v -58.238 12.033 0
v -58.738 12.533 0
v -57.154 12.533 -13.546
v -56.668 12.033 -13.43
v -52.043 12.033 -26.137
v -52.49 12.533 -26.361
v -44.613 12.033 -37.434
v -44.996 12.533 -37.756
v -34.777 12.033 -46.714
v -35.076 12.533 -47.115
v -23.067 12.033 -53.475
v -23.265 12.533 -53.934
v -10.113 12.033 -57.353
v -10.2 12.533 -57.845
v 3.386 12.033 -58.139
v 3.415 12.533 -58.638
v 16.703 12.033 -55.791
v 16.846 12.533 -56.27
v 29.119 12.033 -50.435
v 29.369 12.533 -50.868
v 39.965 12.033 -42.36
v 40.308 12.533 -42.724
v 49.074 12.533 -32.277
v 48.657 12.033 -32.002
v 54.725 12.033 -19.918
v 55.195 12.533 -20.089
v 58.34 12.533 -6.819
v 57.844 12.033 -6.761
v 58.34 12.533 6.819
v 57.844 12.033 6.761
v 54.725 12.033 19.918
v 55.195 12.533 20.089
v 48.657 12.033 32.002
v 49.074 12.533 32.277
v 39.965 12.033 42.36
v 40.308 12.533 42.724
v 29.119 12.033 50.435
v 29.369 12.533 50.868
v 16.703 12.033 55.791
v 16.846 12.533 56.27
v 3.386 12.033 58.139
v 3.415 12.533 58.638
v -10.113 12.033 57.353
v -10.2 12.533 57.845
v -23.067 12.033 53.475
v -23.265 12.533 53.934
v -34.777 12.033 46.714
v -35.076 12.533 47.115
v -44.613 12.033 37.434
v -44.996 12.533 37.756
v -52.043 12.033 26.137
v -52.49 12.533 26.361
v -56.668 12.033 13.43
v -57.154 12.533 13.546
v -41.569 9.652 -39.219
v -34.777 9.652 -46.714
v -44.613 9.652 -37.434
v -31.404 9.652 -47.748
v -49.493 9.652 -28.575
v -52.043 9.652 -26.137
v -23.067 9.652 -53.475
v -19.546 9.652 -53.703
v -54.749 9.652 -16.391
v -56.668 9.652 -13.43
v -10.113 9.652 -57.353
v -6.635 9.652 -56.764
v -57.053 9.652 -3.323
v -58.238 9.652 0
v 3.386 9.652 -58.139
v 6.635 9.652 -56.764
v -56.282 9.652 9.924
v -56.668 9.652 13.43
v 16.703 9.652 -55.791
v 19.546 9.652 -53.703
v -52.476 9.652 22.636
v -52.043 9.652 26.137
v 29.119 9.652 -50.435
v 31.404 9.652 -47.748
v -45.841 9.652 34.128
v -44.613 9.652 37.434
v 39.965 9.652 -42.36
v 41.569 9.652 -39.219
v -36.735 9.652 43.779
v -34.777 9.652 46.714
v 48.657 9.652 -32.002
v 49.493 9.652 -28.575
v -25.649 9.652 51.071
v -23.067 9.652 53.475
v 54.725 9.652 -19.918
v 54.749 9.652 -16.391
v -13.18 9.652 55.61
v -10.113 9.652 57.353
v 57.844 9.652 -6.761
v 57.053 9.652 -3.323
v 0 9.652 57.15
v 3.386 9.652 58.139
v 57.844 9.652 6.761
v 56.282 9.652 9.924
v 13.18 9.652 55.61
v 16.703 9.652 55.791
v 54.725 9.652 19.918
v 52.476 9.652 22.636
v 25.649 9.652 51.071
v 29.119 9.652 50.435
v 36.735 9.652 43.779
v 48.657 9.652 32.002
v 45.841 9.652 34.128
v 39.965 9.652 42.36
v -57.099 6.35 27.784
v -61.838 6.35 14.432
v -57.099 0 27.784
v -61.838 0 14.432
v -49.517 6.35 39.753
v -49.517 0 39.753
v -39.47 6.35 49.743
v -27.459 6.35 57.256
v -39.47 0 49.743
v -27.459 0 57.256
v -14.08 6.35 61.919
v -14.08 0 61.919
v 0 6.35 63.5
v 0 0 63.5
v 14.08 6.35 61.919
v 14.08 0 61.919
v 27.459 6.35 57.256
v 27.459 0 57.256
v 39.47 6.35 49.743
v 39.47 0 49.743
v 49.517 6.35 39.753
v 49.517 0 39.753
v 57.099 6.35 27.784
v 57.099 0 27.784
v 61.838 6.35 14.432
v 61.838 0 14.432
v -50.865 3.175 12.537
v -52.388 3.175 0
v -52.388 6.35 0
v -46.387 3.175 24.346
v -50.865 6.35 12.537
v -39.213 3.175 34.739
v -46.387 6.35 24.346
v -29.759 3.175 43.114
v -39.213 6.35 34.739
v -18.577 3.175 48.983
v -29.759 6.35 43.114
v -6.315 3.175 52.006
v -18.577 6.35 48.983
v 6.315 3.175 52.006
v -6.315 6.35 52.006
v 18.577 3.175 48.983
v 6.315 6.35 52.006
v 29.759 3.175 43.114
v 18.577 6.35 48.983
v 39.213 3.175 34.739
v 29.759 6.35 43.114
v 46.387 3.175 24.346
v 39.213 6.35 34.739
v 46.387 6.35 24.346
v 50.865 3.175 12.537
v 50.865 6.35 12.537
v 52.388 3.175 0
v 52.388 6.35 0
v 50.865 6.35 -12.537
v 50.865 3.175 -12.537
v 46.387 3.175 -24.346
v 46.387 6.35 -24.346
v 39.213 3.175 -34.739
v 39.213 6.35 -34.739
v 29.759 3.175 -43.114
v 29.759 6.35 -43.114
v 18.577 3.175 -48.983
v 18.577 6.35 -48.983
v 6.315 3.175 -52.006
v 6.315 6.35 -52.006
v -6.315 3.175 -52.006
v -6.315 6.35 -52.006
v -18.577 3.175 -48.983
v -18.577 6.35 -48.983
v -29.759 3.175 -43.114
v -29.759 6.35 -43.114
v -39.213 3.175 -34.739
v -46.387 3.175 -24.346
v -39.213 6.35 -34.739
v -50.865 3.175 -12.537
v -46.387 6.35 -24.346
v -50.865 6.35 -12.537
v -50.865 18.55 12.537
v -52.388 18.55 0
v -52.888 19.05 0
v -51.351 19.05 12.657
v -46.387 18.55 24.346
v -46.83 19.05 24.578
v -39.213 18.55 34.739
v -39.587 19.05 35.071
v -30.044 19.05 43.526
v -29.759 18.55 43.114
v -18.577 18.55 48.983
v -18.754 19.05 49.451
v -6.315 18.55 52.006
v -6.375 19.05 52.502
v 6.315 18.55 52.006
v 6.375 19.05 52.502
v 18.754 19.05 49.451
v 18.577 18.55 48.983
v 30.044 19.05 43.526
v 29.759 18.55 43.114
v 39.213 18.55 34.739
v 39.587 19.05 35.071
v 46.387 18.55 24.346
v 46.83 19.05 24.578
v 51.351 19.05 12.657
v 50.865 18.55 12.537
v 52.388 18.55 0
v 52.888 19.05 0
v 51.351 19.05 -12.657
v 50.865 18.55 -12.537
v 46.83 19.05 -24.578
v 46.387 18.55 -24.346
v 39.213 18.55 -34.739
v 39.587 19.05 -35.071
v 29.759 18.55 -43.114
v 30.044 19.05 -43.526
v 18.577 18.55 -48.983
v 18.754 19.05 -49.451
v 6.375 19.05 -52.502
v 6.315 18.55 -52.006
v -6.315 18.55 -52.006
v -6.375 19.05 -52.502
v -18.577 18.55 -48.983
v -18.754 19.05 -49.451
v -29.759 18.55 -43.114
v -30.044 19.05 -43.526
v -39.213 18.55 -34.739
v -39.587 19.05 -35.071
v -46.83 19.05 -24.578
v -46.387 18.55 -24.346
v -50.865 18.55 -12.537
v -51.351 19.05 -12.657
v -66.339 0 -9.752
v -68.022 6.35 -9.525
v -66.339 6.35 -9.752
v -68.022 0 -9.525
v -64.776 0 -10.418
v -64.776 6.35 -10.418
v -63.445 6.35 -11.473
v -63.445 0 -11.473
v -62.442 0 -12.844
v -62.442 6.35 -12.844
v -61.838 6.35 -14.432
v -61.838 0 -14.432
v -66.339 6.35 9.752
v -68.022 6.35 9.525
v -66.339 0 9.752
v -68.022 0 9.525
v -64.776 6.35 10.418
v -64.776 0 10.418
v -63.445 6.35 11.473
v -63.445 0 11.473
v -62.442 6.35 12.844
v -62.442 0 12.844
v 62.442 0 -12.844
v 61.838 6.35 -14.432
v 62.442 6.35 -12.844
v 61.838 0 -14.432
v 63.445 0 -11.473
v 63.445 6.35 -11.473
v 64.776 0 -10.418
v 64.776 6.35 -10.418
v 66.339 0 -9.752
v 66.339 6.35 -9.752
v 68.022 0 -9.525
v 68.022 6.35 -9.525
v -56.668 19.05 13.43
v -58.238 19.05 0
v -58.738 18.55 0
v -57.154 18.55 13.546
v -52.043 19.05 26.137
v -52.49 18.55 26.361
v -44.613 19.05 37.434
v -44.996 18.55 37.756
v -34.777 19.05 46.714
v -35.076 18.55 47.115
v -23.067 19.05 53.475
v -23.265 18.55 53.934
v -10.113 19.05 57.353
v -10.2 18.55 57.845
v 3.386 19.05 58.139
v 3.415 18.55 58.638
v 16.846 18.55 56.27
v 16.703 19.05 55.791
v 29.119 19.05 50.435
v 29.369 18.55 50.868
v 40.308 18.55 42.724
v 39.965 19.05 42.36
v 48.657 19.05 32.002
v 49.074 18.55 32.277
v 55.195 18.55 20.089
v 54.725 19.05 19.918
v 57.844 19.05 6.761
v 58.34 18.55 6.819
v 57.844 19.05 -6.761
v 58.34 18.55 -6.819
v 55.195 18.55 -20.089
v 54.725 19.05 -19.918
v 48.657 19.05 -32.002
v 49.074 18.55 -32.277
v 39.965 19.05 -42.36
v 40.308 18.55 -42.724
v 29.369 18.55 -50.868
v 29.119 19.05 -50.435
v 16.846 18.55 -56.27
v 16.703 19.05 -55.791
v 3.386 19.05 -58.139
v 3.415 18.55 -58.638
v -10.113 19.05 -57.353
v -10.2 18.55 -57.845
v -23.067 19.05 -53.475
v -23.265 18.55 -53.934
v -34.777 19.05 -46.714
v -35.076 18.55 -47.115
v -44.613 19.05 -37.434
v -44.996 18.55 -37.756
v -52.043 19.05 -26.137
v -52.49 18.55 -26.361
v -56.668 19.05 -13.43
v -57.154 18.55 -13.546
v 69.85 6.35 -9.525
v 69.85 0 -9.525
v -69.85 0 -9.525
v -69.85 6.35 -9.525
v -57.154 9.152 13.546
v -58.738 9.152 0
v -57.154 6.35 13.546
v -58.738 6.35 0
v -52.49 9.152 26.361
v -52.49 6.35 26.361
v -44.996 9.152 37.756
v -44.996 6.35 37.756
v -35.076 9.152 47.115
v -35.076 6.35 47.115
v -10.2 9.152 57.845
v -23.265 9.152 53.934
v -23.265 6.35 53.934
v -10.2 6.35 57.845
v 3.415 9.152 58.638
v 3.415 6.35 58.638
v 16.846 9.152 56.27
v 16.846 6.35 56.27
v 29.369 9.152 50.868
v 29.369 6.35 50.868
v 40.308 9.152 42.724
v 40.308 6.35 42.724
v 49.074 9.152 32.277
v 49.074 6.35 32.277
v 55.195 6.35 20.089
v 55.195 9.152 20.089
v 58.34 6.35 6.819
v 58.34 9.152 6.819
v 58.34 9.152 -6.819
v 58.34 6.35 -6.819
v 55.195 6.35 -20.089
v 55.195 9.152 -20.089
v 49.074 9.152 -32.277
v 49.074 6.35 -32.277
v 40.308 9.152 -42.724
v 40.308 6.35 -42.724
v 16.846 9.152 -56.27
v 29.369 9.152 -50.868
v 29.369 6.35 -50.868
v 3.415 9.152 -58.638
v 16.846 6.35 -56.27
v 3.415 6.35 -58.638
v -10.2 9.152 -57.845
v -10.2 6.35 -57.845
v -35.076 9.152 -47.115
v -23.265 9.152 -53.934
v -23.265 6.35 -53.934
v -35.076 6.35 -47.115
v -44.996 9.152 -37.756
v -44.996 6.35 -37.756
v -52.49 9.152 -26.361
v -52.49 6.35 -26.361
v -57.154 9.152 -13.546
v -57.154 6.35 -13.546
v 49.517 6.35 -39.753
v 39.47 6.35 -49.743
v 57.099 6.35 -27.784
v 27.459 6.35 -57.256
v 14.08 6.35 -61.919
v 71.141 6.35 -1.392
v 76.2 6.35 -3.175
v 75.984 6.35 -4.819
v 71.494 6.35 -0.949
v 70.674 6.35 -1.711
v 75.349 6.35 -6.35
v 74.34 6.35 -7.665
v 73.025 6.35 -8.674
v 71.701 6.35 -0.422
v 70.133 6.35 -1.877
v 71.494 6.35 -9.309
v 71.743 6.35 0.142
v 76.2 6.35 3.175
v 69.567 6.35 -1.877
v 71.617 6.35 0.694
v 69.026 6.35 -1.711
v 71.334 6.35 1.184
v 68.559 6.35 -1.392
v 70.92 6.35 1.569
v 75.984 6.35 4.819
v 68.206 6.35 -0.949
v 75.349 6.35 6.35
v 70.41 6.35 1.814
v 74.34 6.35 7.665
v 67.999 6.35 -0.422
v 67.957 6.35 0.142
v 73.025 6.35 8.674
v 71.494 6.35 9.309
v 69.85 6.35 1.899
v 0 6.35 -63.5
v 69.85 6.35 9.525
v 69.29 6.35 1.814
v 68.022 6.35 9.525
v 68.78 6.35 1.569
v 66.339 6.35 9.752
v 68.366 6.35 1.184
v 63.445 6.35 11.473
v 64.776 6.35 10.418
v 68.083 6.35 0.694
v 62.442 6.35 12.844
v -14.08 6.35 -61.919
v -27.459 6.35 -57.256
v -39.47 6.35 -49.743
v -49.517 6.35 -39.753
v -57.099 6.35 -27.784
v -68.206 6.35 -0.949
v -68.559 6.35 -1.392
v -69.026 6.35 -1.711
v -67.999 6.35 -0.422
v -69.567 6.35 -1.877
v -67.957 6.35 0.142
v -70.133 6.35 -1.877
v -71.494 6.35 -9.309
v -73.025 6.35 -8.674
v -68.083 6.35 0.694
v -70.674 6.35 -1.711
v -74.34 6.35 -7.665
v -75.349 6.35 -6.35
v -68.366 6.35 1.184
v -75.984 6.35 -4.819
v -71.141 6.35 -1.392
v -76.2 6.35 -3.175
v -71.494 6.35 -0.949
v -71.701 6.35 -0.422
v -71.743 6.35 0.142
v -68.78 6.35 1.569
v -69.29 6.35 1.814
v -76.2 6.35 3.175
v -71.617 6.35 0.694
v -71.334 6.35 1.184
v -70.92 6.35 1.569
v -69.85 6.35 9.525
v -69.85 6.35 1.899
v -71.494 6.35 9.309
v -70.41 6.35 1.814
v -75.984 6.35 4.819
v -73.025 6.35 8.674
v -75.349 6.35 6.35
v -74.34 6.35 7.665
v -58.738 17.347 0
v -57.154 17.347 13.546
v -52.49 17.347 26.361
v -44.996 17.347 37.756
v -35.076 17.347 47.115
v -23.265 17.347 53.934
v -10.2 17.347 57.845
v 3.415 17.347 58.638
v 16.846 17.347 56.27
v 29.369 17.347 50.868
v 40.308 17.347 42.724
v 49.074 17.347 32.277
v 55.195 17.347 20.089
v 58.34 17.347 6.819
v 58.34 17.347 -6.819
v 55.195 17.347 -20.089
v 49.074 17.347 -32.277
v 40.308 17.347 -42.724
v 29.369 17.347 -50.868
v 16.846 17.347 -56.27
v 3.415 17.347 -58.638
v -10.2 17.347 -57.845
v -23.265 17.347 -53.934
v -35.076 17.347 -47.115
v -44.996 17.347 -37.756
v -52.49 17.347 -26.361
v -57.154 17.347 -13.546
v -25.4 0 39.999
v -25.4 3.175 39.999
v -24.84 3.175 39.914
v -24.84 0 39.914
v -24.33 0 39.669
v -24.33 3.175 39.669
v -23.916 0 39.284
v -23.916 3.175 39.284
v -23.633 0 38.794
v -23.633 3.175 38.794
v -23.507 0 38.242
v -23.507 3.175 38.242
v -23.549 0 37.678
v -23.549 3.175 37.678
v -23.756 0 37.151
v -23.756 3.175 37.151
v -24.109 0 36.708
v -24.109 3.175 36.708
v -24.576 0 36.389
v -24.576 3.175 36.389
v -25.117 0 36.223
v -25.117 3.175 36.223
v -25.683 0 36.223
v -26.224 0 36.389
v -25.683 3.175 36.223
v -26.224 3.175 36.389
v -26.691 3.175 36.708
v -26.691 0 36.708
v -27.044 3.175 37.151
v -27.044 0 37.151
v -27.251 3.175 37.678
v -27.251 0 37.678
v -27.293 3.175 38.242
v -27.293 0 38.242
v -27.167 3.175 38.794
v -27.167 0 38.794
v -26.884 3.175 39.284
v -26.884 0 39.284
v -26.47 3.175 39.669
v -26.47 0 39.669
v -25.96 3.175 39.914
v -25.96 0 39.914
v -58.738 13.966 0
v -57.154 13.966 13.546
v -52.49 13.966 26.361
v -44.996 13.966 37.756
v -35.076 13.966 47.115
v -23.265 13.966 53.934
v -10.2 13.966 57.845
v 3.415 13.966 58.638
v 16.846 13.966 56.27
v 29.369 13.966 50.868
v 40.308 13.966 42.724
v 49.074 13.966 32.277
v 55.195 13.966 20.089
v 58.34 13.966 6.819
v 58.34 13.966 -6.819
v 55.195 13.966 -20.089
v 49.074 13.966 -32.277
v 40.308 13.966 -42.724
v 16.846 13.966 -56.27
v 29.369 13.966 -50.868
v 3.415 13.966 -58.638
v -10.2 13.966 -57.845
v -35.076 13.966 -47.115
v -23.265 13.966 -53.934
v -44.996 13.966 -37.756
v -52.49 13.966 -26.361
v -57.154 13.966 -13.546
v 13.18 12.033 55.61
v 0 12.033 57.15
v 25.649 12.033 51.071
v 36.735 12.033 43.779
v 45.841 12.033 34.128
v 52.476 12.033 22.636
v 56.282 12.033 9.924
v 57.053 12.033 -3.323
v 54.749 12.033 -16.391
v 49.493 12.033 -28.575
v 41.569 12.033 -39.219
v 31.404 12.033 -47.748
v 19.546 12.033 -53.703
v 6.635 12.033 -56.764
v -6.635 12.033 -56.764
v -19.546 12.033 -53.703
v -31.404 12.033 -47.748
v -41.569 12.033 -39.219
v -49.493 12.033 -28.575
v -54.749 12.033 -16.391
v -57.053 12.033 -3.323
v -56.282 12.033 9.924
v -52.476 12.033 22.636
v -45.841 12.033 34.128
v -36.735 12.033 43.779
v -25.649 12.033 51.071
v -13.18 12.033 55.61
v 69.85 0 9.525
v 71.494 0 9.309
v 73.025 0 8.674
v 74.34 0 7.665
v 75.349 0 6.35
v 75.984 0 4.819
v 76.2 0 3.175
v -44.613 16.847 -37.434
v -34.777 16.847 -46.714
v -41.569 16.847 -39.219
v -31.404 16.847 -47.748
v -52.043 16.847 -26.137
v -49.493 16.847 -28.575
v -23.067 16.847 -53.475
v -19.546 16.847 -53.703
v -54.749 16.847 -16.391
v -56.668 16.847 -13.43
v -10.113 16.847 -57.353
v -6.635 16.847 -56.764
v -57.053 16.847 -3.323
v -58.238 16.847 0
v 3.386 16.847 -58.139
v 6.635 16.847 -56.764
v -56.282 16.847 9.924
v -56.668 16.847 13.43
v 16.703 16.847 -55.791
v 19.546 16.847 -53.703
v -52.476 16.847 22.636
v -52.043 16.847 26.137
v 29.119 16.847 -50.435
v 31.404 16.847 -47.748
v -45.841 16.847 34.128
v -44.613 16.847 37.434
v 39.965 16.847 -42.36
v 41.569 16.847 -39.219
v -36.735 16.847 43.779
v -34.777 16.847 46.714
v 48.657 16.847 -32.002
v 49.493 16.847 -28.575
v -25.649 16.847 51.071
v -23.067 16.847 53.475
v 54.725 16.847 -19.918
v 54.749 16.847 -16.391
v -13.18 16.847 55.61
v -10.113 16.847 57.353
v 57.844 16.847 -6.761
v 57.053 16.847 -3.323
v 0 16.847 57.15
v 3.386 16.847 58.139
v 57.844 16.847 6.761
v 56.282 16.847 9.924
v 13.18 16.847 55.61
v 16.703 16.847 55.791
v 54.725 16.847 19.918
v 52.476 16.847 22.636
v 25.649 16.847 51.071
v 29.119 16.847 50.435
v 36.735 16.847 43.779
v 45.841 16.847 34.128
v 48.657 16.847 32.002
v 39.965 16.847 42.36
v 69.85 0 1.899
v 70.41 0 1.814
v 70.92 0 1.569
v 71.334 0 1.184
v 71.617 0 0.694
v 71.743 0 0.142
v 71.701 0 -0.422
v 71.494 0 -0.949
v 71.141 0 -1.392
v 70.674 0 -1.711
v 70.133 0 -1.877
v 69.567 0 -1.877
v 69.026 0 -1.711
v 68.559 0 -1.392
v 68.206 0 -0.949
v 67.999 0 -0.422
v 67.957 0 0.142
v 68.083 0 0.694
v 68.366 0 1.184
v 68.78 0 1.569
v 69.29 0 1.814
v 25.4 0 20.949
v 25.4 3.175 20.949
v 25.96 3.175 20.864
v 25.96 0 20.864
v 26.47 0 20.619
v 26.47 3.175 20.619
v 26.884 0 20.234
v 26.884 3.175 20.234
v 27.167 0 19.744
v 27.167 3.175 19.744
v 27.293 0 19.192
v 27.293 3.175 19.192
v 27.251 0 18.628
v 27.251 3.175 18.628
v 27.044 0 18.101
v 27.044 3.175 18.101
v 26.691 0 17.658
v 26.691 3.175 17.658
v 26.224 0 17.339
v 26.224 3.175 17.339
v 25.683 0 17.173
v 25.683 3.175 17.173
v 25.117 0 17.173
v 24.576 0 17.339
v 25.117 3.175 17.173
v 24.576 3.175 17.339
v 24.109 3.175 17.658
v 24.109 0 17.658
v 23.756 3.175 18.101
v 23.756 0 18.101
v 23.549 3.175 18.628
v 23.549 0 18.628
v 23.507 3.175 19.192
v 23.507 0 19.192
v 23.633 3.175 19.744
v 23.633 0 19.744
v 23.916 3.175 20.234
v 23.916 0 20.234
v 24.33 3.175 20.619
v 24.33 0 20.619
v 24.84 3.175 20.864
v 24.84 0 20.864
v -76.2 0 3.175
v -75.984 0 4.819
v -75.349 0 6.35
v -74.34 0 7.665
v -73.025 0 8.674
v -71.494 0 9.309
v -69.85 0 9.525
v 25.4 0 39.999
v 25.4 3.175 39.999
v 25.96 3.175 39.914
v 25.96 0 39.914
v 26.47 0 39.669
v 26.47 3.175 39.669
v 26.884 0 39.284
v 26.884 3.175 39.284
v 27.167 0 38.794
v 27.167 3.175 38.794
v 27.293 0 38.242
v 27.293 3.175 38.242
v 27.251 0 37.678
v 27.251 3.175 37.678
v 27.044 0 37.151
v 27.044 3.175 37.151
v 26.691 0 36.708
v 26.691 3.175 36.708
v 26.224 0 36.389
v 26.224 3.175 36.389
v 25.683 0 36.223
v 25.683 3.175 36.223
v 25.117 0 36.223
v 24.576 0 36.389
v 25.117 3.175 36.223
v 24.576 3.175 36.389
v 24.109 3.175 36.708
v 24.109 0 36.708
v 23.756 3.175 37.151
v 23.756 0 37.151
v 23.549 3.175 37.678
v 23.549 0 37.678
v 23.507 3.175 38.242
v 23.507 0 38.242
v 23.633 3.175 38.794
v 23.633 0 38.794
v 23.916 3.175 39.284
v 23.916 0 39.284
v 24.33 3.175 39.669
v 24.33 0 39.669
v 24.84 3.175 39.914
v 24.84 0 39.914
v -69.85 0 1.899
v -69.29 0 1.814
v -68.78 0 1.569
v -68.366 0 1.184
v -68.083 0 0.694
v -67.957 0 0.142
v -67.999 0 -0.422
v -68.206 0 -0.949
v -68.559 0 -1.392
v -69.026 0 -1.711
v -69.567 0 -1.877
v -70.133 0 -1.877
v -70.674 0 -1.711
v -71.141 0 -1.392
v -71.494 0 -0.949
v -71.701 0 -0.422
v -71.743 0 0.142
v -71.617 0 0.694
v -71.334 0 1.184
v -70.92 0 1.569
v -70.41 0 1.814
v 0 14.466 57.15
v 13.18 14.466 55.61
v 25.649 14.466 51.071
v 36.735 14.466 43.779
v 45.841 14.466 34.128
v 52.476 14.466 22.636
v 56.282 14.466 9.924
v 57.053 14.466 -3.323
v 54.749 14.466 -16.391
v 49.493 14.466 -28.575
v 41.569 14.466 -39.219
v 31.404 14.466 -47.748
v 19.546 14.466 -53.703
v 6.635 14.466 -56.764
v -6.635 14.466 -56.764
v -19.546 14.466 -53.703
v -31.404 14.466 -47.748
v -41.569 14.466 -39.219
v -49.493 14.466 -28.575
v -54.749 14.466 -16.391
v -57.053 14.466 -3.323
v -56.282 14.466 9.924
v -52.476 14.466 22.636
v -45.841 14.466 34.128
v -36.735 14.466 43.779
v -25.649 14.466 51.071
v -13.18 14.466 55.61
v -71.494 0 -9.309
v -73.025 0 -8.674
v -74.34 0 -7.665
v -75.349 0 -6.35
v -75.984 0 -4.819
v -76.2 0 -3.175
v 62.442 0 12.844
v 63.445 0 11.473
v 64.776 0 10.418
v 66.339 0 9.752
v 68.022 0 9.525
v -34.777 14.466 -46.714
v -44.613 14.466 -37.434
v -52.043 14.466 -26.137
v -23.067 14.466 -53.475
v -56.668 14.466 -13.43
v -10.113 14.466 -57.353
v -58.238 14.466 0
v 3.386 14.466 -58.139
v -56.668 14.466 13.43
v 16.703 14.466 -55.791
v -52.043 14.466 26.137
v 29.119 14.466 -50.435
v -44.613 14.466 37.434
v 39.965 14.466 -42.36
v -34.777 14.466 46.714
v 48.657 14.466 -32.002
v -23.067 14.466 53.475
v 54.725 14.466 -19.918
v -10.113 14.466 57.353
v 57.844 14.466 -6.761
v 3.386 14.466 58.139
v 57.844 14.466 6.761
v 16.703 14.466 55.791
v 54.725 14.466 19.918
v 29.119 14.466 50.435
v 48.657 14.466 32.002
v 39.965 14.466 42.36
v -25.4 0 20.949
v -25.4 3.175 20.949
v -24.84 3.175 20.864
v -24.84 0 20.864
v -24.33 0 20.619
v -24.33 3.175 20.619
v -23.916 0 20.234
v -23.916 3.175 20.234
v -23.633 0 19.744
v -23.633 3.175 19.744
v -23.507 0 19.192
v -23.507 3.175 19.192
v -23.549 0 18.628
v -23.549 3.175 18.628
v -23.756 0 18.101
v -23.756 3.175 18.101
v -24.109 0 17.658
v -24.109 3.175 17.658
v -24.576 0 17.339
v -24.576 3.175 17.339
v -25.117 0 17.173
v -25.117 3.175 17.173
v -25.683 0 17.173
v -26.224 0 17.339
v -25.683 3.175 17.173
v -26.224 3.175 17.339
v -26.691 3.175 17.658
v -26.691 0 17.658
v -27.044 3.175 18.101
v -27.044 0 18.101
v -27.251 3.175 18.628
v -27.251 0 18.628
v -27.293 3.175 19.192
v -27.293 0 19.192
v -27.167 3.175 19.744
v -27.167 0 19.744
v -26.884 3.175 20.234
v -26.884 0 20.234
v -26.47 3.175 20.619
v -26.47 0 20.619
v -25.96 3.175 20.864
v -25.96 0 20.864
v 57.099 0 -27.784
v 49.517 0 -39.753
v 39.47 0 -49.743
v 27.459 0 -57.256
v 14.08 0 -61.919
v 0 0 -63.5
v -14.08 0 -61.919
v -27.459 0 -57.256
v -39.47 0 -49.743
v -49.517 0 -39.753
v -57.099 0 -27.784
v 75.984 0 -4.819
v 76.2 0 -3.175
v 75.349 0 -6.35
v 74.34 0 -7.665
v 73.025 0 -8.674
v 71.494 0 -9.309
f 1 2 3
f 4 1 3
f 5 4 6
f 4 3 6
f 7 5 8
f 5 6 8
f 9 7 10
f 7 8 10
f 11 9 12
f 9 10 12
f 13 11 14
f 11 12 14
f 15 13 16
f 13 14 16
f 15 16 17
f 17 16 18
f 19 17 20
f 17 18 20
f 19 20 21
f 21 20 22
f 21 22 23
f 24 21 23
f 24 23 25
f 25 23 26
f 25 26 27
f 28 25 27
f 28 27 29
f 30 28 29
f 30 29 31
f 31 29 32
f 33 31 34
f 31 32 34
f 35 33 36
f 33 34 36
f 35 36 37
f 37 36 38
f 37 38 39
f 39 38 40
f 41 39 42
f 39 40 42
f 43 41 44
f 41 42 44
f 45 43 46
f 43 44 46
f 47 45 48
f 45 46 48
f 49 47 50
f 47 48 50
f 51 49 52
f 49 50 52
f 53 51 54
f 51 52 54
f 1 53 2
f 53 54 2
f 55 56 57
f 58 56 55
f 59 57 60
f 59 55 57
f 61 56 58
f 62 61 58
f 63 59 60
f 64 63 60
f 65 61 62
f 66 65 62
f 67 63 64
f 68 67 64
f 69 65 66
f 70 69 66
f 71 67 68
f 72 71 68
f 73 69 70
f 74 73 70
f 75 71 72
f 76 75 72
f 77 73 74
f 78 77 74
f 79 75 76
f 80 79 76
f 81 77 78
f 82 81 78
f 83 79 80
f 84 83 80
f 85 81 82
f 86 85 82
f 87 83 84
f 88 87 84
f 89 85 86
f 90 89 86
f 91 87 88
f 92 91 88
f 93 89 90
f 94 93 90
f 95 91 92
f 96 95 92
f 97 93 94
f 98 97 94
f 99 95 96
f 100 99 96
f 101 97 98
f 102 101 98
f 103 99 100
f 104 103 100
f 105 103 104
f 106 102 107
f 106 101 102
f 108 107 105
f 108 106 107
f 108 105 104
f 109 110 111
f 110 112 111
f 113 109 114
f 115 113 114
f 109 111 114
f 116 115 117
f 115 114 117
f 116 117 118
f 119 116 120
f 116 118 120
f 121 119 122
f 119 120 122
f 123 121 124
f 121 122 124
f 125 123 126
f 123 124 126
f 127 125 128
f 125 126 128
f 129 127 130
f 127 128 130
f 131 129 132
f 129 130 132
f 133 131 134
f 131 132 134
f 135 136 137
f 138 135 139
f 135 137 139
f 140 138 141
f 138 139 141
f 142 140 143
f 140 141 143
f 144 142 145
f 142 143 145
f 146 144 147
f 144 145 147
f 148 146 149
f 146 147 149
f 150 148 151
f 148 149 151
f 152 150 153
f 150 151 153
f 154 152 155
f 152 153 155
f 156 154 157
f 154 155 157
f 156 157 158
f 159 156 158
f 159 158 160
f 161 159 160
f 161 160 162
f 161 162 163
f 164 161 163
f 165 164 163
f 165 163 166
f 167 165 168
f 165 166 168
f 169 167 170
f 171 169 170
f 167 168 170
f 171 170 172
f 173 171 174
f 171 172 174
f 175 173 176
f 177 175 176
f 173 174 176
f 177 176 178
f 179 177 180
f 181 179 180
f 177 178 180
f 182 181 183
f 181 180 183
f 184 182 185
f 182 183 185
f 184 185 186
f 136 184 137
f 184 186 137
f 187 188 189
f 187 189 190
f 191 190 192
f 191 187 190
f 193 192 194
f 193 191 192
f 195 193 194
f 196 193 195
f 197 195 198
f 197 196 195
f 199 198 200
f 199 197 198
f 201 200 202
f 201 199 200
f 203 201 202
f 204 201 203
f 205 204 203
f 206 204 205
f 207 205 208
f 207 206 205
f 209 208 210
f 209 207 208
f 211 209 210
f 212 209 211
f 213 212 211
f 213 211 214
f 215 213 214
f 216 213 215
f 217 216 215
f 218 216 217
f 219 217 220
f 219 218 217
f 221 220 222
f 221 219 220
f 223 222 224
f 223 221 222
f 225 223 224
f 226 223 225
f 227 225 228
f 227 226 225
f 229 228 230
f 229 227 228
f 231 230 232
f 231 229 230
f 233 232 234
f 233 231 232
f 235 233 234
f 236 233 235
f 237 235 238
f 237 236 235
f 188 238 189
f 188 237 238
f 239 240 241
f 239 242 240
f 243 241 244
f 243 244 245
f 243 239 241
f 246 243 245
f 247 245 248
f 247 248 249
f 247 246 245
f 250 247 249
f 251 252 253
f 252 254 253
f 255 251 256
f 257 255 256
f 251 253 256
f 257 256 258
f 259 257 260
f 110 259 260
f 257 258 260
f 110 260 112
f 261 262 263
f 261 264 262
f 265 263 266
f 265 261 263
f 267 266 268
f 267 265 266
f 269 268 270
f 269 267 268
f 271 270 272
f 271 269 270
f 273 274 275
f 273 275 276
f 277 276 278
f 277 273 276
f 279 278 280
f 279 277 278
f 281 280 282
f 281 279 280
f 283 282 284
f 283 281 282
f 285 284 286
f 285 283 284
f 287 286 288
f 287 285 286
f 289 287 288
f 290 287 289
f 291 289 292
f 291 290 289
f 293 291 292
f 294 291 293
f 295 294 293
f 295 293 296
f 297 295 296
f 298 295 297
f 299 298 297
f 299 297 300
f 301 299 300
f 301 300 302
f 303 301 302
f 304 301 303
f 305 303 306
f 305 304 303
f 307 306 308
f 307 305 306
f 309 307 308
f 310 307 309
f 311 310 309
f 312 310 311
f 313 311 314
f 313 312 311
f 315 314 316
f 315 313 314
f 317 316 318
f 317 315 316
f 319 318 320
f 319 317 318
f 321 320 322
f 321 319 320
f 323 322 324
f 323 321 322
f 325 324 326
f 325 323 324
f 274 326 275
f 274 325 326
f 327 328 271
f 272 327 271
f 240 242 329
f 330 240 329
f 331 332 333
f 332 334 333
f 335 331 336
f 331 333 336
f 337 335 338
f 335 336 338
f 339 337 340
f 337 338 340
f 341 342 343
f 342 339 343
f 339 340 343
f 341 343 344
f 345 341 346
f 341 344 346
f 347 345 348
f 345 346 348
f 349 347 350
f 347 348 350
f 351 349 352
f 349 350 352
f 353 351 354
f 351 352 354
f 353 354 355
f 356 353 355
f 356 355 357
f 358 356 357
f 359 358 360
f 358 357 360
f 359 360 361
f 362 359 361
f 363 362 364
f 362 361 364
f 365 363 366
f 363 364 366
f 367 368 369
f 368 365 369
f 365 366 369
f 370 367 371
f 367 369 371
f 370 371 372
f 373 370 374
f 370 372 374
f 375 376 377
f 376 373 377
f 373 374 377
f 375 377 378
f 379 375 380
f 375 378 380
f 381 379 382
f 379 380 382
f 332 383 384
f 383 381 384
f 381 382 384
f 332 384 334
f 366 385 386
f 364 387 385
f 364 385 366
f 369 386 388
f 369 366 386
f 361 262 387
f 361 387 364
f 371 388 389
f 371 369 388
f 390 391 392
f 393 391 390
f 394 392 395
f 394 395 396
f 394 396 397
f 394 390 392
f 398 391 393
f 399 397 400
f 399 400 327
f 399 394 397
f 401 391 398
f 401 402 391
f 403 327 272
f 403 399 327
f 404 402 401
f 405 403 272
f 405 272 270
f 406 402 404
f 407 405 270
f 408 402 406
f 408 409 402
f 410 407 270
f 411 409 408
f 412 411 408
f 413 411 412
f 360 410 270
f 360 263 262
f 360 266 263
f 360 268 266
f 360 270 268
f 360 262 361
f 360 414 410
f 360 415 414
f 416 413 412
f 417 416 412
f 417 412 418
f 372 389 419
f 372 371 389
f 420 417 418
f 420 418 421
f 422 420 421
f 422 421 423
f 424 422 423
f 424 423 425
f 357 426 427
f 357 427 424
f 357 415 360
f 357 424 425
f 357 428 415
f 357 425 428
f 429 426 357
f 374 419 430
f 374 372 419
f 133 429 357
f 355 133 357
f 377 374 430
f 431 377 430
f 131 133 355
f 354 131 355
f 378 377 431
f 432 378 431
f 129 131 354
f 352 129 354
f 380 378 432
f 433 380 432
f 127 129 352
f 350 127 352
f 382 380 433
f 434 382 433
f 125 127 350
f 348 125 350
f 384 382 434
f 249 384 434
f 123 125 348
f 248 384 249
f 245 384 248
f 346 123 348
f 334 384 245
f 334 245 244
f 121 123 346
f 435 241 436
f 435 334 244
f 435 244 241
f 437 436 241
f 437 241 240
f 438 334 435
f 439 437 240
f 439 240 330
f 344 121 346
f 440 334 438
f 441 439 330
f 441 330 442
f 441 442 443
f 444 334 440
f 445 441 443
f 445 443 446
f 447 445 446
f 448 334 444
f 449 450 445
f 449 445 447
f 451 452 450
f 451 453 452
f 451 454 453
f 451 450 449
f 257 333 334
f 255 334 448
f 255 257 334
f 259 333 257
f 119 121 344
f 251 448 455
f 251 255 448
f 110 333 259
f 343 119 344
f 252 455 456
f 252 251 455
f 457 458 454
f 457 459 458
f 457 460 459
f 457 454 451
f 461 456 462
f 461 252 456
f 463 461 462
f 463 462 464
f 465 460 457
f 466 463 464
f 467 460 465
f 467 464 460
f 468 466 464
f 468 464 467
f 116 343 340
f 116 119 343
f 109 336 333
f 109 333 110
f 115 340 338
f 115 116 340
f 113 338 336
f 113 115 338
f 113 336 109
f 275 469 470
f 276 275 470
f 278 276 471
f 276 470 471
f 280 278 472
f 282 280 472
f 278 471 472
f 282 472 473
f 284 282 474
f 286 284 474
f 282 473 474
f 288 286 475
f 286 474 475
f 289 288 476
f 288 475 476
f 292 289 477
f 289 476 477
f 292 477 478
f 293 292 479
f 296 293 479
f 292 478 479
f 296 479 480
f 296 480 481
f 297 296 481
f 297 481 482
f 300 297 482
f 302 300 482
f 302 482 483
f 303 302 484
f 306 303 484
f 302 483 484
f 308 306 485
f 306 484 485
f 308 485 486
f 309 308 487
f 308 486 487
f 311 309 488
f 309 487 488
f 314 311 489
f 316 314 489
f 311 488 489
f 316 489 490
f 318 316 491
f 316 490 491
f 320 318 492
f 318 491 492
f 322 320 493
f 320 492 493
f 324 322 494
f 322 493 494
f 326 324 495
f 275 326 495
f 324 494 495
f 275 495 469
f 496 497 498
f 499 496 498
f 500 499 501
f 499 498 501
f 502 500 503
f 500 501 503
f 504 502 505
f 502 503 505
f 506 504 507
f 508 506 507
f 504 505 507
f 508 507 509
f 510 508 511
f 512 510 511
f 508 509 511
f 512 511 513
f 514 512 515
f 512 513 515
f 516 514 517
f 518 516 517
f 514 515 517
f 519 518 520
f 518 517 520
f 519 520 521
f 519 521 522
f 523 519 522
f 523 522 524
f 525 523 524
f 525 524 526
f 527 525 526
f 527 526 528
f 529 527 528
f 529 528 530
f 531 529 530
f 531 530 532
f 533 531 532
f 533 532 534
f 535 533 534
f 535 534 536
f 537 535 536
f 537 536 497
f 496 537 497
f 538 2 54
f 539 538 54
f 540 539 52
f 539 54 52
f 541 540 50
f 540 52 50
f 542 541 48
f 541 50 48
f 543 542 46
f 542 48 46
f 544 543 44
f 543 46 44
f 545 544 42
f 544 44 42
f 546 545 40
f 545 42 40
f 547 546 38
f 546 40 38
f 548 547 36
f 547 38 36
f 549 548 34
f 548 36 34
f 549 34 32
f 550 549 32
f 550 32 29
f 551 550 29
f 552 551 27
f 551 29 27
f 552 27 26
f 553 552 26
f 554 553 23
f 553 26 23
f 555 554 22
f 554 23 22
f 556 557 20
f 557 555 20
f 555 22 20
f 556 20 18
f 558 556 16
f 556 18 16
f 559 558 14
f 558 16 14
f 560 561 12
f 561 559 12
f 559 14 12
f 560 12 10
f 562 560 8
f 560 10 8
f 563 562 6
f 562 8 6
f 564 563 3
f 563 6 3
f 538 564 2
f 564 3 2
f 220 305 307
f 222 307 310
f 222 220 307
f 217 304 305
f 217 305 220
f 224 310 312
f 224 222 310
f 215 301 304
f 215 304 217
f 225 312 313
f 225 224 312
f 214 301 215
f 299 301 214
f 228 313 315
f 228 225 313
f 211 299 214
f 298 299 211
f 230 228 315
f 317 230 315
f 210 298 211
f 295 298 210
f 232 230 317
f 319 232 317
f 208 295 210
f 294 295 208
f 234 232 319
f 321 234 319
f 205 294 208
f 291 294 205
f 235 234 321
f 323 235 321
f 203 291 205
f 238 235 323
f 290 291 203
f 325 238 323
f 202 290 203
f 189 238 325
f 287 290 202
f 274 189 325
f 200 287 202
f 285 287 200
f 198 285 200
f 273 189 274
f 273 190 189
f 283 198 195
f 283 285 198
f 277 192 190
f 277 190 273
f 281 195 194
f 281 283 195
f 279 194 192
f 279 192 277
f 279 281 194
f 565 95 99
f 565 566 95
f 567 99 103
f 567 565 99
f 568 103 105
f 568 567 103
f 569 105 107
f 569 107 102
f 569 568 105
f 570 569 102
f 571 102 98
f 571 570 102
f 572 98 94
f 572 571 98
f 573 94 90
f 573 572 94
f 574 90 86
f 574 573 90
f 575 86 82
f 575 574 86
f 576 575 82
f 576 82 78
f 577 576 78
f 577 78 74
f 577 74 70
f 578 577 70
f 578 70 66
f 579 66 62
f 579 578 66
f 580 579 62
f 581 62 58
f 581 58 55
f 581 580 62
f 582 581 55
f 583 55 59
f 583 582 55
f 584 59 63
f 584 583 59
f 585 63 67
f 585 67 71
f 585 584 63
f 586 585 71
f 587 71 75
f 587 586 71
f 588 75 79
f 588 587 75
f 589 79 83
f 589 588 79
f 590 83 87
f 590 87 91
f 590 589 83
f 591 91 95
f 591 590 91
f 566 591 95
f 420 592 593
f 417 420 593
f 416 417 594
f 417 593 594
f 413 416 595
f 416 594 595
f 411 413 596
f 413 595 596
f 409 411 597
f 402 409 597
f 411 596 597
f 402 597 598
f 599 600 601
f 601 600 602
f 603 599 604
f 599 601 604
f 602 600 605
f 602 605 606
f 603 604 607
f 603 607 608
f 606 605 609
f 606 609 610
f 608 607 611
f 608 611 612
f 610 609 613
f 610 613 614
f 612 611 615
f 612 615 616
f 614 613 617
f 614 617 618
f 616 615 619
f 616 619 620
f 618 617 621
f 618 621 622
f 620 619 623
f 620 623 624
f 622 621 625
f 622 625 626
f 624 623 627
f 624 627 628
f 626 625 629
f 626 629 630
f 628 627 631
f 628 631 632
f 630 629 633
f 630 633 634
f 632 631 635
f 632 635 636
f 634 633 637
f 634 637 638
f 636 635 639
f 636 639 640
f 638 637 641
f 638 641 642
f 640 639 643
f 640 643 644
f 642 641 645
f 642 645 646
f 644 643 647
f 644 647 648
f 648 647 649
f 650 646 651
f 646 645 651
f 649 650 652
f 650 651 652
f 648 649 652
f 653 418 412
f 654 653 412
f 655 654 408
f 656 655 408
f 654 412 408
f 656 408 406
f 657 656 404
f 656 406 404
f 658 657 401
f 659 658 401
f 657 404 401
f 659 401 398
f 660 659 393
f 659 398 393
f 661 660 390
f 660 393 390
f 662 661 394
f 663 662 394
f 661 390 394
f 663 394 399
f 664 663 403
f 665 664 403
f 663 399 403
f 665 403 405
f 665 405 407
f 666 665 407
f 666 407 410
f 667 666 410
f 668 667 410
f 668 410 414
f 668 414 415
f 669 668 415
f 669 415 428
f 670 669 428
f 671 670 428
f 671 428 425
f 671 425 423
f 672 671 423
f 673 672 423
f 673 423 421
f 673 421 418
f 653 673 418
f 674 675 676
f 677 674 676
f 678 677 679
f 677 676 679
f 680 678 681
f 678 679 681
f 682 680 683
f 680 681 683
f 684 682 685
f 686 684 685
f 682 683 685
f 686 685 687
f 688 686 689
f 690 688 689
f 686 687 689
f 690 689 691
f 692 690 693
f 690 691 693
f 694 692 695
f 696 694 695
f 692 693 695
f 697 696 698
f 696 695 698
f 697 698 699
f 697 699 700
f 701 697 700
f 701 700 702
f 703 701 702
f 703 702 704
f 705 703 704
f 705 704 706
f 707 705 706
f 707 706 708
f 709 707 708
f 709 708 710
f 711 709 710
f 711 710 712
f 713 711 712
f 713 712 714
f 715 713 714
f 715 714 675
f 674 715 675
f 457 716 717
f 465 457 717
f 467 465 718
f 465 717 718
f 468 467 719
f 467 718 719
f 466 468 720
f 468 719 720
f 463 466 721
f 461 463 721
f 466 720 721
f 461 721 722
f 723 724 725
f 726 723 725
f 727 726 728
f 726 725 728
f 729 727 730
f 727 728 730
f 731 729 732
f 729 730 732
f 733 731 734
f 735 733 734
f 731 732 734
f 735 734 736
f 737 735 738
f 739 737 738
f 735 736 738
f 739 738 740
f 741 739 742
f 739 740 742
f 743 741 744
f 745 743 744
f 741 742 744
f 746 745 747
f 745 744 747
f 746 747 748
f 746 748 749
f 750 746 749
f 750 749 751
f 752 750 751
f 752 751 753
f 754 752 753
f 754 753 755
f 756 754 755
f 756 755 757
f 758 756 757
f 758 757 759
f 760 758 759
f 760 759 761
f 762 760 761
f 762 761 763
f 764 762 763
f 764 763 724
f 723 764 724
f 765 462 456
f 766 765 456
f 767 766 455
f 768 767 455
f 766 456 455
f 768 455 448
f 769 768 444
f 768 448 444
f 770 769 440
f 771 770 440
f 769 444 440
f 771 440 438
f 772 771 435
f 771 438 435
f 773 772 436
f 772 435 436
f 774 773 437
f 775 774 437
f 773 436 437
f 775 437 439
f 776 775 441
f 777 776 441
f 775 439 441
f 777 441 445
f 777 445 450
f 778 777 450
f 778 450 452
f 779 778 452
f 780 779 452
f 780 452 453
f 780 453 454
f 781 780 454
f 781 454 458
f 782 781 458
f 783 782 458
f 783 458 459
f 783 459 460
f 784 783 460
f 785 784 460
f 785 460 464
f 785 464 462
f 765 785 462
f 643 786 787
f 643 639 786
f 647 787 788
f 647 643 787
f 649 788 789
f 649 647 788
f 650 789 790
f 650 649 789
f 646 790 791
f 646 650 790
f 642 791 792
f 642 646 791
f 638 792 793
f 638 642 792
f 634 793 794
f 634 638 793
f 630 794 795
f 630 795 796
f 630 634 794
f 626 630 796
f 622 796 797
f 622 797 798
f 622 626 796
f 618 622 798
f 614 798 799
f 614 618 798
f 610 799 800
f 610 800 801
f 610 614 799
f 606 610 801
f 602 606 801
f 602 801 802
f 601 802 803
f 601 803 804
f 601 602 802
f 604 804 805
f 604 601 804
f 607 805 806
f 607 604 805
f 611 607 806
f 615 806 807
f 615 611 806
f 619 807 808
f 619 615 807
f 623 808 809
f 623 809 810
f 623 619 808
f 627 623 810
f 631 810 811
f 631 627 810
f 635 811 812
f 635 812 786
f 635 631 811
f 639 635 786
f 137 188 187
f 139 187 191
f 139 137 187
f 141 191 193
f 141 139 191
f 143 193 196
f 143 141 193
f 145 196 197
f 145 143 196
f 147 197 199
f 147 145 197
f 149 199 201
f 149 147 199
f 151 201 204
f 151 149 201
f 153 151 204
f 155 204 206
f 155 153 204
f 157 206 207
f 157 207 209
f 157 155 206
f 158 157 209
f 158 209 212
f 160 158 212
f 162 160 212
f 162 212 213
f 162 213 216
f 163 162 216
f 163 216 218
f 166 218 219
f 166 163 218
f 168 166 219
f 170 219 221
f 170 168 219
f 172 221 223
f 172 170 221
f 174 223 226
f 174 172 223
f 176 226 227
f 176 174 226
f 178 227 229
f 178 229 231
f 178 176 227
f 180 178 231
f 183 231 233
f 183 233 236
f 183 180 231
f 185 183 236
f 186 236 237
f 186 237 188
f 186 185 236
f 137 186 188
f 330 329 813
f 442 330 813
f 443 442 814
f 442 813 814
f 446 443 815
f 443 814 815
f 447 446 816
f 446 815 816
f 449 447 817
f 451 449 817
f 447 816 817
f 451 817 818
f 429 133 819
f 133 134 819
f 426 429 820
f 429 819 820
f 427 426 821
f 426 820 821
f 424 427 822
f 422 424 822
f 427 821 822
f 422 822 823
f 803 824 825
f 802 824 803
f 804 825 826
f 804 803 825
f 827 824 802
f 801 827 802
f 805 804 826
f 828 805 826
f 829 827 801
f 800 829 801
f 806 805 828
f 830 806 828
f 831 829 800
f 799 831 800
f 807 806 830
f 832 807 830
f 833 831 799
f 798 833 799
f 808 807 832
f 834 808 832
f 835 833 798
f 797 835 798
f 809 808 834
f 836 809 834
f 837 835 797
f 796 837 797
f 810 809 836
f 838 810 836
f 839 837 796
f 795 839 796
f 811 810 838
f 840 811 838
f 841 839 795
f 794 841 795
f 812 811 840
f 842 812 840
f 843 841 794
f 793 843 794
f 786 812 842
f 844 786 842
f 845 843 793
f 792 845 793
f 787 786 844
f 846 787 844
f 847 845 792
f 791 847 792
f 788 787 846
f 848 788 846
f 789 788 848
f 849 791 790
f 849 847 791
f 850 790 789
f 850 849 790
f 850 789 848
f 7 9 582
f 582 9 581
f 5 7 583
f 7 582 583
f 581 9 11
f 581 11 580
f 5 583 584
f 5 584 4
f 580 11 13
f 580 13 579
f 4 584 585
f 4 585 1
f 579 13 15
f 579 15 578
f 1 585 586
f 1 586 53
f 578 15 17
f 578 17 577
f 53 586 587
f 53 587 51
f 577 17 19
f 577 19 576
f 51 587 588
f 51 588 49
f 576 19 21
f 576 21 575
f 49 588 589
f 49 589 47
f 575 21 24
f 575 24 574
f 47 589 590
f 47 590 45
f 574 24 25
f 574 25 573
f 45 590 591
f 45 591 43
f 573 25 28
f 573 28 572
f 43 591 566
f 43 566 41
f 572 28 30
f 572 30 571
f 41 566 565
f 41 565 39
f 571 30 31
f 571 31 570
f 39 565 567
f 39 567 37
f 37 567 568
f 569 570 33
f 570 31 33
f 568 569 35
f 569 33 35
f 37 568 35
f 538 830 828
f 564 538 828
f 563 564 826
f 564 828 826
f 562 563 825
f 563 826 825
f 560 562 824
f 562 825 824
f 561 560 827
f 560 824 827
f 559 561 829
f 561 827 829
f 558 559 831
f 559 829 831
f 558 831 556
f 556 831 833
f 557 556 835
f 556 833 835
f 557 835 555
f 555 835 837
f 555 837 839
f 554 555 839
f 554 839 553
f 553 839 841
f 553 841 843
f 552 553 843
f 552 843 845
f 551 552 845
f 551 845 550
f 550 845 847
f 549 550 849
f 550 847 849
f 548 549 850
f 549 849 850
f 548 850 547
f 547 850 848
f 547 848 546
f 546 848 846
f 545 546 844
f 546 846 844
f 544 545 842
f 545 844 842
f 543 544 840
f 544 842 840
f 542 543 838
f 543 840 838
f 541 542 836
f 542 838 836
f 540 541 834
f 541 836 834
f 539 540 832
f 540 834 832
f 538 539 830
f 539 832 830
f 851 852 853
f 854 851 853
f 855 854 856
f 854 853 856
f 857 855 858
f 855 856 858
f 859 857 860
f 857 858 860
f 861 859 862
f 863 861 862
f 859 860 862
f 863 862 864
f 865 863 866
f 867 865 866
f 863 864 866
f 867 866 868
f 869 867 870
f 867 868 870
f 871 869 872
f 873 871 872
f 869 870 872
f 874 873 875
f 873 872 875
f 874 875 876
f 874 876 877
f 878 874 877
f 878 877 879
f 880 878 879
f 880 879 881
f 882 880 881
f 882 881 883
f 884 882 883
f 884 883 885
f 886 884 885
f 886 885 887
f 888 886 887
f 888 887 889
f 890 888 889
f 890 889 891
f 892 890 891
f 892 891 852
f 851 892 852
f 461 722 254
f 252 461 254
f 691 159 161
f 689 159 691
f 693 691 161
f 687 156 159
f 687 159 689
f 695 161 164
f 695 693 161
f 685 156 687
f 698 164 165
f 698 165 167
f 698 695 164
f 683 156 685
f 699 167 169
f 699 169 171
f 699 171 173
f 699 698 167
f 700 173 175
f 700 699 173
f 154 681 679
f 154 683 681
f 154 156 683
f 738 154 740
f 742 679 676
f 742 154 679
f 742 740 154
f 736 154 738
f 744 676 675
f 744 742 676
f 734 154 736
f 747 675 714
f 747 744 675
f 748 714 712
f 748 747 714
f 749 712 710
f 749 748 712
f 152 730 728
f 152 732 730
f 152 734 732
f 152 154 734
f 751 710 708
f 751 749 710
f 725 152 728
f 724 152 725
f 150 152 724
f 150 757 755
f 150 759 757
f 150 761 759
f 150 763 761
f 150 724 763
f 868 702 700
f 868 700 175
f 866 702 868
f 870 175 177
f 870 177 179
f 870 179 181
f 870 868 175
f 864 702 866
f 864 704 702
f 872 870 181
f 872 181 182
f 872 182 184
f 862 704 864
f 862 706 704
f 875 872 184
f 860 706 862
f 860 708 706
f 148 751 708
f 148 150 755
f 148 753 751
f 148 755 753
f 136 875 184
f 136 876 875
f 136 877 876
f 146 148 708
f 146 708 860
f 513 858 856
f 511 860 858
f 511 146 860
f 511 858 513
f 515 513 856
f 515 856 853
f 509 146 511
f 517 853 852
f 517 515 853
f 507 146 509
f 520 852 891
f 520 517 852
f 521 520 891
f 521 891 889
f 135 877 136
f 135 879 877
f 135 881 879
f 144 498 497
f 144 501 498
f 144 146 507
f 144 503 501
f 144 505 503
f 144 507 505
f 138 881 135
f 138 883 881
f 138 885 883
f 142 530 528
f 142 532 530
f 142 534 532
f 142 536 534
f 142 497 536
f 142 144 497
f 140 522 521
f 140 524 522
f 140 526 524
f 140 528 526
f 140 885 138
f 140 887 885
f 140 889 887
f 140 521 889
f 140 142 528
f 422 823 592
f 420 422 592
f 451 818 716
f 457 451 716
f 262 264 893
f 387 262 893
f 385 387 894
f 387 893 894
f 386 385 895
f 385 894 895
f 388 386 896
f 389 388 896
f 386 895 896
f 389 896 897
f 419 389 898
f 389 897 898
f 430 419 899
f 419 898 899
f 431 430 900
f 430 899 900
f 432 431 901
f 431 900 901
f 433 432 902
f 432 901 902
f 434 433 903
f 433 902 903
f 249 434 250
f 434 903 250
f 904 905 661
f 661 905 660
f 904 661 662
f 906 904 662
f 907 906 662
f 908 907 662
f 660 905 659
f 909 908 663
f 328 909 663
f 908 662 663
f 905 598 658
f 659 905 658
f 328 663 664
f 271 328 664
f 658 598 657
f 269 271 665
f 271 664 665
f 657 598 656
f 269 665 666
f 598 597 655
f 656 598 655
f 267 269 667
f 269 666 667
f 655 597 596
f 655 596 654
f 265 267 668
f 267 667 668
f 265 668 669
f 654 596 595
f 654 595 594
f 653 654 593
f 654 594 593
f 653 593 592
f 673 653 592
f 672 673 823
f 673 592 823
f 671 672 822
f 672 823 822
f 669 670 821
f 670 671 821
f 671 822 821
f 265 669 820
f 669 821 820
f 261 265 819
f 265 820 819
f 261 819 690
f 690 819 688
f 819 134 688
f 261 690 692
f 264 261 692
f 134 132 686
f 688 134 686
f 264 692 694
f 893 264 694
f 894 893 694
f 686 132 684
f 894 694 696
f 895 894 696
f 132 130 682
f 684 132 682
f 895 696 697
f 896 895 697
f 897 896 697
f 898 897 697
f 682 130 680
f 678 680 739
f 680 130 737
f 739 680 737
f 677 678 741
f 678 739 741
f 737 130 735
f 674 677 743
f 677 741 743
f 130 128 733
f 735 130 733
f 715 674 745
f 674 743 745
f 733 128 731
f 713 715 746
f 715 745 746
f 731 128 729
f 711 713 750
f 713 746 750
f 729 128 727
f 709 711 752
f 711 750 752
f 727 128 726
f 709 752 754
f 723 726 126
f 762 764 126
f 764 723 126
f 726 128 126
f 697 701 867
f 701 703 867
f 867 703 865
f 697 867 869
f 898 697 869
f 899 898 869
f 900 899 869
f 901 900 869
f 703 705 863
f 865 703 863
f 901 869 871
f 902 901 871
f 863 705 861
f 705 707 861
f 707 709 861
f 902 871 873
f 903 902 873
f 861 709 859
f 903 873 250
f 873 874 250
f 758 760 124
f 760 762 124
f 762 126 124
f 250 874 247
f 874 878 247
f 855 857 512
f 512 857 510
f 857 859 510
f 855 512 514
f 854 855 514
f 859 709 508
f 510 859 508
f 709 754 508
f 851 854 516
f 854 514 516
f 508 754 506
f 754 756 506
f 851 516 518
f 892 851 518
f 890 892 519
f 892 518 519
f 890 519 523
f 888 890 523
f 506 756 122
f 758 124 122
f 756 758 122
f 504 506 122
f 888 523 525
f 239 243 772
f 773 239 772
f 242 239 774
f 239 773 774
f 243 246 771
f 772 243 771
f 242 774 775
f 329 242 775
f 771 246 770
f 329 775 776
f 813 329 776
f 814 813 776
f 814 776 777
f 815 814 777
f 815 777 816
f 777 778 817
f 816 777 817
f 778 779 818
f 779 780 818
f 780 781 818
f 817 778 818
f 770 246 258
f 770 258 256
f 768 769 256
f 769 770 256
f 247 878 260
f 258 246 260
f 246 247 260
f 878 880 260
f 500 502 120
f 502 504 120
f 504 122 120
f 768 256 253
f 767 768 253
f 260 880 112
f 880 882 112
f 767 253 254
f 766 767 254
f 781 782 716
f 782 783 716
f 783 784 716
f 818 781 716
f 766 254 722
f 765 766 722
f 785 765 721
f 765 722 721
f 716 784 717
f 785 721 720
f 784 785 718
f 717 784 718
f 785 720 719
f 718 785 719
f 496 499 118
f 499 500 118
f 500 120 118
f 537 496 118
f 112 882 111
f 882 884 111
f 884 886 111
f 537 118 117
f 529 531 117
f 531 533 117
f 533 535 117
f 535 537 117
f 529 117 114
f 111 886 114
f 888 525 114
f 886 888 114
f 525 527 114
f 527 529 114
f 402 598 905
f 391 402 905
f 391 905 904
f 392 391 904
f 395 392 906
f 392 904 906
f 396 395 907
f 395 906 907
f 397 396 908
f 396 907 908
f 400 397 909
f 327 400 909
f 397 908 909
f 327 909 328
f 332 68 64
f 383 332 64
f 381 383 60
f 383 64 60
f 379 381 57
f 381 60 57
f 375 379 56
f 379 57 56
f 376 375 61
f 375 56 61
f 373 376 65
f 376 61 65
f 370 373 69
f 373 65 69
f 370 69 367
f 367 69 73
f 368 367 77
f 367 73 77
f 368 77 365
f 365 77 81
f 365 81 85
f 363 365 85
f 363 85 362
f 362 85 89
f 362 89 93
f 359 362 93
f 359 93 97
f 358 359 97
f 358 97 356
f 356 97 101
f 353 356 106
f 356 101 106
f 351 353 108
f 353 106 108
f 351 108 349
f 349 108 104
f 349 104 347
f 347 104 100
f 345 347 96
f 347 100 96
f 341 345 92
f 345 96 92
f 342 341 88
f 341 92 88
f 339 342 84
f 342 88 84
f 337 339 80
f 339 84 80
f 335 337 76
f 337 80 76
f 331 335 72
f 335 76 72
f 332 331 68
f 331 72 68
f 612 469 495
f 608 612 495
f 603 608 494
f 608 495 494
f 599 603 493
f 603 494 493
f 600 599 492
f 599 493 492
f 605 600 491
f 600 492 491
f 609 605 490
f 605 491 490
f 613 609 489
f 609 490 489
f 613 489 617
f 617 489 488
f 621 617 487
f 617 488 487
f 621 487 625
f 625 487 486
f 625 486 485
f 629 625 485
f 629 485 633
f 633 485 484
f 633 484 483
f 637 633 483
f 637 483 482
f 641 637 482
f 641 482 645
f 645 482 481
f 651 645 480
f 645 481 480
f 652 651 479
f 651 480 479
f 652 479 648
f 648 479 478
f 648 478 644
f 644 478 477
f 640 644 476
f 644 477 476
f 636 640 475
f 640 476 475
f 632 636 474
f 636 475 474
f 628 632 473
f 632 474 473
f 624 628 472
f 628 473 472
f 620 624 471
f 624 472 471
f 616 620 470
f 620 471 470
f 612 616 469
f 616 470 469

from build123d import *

# Parameters (mm, degrees)
SKETCH1_R                 = 63.5
EXTRUDE1_DEPTH            = 6.35
SKETCH2_R                 = 58.7375
SKETCH2_R_2               = 52.3875
EXTRUDE2_DEPTH            = 12.7
SKETCH3_W                 = 1.5875
SKETCH3_H                 = 2.38125
CHAMFER1_SIZE             = 0.5
EXTRUDE3_DEPTH            = 6.35
F_6_CLEARANCE_HOLE1_D     = 3.7973
F_6_CLEARANCE_HOLE1_DEPTH = 330.2
F_6_CLEARANCE_HOLE1_TIP   = 1.140824014
FILLET1_R                 = 6.35
F_6_CLEARANCE_HOLE2_D     = 3.7973
F_6_CLEARANCE_HOLE2_DEPTH = 25.4
F_6_CLEARANCE_HOLE2_TIP   = 1.140824014
SKETCH8_R                 = 52.3875
CUT_EXTRUDE1_DEPTH        = 3.175


with BuildPart() as part:
    # Sketch1 → Extrude1 (new body)
    with BuildSketch(Plane(origin=(0, 0, 0), x_dir=(1, 0, 0), z_dir=(0, 1, 0))):
        Circle(SKETCH1_R)
    extrude(amount=EXTRUDE1_DEPTH)

    # Sketch2 → Extrude2 (add)
    with BuildSketch(Plane(origin=(0, 6.35, 0), x_dir=(-1, 0, 0), z_dir=(0, 1, 0))):
        Circle(SKETCH2_R)
        Circle(SKETCH2_R_2, mode=Mode.SUBTRACT)
    extrude(amount=EXTRUDE2_DEPTH)

    # Sketch3 → Cut-Revolve1 (revolve, cut)
    with BuildSketch(Plane(origin=(0, 0, 0), x_dir=(0, 0, -1), z_dir=(1, 0, 0))):
        with Locations((-57.94375, 15.656558664)):
            Rectangle(SKETCH3_W, SKETCH3_H)
        with Locations((-57.94375, 10.842416167)):
            Rectangle(SKETCH3_W, SKETCH3_H)
    revolve(axis=Axis((0, 0, 0), (0, 1, 0)), mode=Mode.SUBTRACT)

    # Chamfer1
    chamfer1_edges = [part.edges().sort_by_distance(p)[0] for p in [
        (58.7375, 16.847183664, 0),
        (58.7375, 14.465933664, 0),
        (58.7375, 12.033041167, 0),
        (58.7375, 9.651791167, 0),
        (58.7375, 19.05, 0),
        (52.3875, 19.05, 0),
    ]]
    chamfer(chamfer1_edges, length=CHAMFER1_SIZE)

    # Sketch5 → Extrude3 (add)
    with BuildSketch(Plane.XZ):
        with BuildLine():
            Line((-69.85, 9.525), (69.85, 9.525))
            ThreePointArc((69.85, 9.525), (74.340128061, 7.665128061), (76.2, 3.175))
            Line((76.2, 3.175), (76.2, -3.175))
            ThreePointArc((76.2, -3.175), (74.340128061, -7.665128061), (69.85, -9.525))
            Line((69.85, -9.525), (-69.85, -9.525))
            ThreePointArc((-69.85, -9.525), (-74.340128061, -7.665128061), (-76.2, -3.175))
            Line((-76.2, -3.175), (-76.2, 3.175))
            ThreePointArc((-76.2, 3.175), (-74.340128061, 7.665128061), (-69.85, 9.525))
        make_face()
    extrude(amount=-EXTRUDE3_DEPTH)

    # #6 Clearance Hole1
    with Locations(Plane(origin=(-69.85, 0, 0), x_dir=(0, 0, -1), z_dir=(0, -1, 0))):
        with Locations((0, 0), (0, 139.7)):
            Hole(F_6_CLEARANCE_HOLE1_D / 2, depth=F_6_CLEARANCE_HOLE1_DEPTH)
            with Locations((0, 0, -(F_6_CLEARANCE_HOLE1_DEPTH + F_6_CLEARANCE_HOLE1_TIP / 2))):  # 118° drill point
                Cone(0, F_6_CLEARANCE_HOLE1_D / 2, F_6_CLEARANCE_HOLE1_TIP, mode=Mode.SUBTRACT)

    # Fillet1
    fillet1_edges = [part.edges().sort_by_distance(p)[0] for p in [
        (62.781560788, 3.175, -9.525),
        (-62.781560788, 3.175, -9.525),
        (-62.781560788, 3.175, 9.525),
        (62.781560788, 3.175, 9.525),
    ]]
    fillet(fillet1_edges, radius=FILLET1_R)

    # #6 Clearance Hole2
    with Locations(Plane(origin=(25.4, 0, 19.05), x_dir=(0, 0, -1), z_dir=(0, -1, 0))):
        with Locations((0, 0), (-19.05, 0), (-19.05, -50.8), (0, -50.8)):
            Hole(F_6_CLEARANCE_HOLE2_D / 2, depth=F_6_CLEARANCE_HOLE2_DEPTH)
            with Locations((0, 0, -(F_6_CLEARANCE_HOLE2_DEPTH + F_6_CLEARANCE_HOLE2_TIP / 2))):  # 118° drill point
                Cone(0, F_6_CLEARANCE_HOLE2_D / 2, F_6_CLEARANCE_HOLE2_TIP, mode=Mode.SUBTRACT)

    # Sketch8 → Cut-Extrude1 (cut)
    with BuildSketch(Plane(origin=(0, 6.35, 0), x_dir=(-1, 0, 0), z_dir=(0, 1, 0))):
        Circle(SKETCH8_R)
    extrude(amount=-CUT_EXTRUDE1_DEPTH, mode=Mode.SUBTRACT)


solid = part.part
